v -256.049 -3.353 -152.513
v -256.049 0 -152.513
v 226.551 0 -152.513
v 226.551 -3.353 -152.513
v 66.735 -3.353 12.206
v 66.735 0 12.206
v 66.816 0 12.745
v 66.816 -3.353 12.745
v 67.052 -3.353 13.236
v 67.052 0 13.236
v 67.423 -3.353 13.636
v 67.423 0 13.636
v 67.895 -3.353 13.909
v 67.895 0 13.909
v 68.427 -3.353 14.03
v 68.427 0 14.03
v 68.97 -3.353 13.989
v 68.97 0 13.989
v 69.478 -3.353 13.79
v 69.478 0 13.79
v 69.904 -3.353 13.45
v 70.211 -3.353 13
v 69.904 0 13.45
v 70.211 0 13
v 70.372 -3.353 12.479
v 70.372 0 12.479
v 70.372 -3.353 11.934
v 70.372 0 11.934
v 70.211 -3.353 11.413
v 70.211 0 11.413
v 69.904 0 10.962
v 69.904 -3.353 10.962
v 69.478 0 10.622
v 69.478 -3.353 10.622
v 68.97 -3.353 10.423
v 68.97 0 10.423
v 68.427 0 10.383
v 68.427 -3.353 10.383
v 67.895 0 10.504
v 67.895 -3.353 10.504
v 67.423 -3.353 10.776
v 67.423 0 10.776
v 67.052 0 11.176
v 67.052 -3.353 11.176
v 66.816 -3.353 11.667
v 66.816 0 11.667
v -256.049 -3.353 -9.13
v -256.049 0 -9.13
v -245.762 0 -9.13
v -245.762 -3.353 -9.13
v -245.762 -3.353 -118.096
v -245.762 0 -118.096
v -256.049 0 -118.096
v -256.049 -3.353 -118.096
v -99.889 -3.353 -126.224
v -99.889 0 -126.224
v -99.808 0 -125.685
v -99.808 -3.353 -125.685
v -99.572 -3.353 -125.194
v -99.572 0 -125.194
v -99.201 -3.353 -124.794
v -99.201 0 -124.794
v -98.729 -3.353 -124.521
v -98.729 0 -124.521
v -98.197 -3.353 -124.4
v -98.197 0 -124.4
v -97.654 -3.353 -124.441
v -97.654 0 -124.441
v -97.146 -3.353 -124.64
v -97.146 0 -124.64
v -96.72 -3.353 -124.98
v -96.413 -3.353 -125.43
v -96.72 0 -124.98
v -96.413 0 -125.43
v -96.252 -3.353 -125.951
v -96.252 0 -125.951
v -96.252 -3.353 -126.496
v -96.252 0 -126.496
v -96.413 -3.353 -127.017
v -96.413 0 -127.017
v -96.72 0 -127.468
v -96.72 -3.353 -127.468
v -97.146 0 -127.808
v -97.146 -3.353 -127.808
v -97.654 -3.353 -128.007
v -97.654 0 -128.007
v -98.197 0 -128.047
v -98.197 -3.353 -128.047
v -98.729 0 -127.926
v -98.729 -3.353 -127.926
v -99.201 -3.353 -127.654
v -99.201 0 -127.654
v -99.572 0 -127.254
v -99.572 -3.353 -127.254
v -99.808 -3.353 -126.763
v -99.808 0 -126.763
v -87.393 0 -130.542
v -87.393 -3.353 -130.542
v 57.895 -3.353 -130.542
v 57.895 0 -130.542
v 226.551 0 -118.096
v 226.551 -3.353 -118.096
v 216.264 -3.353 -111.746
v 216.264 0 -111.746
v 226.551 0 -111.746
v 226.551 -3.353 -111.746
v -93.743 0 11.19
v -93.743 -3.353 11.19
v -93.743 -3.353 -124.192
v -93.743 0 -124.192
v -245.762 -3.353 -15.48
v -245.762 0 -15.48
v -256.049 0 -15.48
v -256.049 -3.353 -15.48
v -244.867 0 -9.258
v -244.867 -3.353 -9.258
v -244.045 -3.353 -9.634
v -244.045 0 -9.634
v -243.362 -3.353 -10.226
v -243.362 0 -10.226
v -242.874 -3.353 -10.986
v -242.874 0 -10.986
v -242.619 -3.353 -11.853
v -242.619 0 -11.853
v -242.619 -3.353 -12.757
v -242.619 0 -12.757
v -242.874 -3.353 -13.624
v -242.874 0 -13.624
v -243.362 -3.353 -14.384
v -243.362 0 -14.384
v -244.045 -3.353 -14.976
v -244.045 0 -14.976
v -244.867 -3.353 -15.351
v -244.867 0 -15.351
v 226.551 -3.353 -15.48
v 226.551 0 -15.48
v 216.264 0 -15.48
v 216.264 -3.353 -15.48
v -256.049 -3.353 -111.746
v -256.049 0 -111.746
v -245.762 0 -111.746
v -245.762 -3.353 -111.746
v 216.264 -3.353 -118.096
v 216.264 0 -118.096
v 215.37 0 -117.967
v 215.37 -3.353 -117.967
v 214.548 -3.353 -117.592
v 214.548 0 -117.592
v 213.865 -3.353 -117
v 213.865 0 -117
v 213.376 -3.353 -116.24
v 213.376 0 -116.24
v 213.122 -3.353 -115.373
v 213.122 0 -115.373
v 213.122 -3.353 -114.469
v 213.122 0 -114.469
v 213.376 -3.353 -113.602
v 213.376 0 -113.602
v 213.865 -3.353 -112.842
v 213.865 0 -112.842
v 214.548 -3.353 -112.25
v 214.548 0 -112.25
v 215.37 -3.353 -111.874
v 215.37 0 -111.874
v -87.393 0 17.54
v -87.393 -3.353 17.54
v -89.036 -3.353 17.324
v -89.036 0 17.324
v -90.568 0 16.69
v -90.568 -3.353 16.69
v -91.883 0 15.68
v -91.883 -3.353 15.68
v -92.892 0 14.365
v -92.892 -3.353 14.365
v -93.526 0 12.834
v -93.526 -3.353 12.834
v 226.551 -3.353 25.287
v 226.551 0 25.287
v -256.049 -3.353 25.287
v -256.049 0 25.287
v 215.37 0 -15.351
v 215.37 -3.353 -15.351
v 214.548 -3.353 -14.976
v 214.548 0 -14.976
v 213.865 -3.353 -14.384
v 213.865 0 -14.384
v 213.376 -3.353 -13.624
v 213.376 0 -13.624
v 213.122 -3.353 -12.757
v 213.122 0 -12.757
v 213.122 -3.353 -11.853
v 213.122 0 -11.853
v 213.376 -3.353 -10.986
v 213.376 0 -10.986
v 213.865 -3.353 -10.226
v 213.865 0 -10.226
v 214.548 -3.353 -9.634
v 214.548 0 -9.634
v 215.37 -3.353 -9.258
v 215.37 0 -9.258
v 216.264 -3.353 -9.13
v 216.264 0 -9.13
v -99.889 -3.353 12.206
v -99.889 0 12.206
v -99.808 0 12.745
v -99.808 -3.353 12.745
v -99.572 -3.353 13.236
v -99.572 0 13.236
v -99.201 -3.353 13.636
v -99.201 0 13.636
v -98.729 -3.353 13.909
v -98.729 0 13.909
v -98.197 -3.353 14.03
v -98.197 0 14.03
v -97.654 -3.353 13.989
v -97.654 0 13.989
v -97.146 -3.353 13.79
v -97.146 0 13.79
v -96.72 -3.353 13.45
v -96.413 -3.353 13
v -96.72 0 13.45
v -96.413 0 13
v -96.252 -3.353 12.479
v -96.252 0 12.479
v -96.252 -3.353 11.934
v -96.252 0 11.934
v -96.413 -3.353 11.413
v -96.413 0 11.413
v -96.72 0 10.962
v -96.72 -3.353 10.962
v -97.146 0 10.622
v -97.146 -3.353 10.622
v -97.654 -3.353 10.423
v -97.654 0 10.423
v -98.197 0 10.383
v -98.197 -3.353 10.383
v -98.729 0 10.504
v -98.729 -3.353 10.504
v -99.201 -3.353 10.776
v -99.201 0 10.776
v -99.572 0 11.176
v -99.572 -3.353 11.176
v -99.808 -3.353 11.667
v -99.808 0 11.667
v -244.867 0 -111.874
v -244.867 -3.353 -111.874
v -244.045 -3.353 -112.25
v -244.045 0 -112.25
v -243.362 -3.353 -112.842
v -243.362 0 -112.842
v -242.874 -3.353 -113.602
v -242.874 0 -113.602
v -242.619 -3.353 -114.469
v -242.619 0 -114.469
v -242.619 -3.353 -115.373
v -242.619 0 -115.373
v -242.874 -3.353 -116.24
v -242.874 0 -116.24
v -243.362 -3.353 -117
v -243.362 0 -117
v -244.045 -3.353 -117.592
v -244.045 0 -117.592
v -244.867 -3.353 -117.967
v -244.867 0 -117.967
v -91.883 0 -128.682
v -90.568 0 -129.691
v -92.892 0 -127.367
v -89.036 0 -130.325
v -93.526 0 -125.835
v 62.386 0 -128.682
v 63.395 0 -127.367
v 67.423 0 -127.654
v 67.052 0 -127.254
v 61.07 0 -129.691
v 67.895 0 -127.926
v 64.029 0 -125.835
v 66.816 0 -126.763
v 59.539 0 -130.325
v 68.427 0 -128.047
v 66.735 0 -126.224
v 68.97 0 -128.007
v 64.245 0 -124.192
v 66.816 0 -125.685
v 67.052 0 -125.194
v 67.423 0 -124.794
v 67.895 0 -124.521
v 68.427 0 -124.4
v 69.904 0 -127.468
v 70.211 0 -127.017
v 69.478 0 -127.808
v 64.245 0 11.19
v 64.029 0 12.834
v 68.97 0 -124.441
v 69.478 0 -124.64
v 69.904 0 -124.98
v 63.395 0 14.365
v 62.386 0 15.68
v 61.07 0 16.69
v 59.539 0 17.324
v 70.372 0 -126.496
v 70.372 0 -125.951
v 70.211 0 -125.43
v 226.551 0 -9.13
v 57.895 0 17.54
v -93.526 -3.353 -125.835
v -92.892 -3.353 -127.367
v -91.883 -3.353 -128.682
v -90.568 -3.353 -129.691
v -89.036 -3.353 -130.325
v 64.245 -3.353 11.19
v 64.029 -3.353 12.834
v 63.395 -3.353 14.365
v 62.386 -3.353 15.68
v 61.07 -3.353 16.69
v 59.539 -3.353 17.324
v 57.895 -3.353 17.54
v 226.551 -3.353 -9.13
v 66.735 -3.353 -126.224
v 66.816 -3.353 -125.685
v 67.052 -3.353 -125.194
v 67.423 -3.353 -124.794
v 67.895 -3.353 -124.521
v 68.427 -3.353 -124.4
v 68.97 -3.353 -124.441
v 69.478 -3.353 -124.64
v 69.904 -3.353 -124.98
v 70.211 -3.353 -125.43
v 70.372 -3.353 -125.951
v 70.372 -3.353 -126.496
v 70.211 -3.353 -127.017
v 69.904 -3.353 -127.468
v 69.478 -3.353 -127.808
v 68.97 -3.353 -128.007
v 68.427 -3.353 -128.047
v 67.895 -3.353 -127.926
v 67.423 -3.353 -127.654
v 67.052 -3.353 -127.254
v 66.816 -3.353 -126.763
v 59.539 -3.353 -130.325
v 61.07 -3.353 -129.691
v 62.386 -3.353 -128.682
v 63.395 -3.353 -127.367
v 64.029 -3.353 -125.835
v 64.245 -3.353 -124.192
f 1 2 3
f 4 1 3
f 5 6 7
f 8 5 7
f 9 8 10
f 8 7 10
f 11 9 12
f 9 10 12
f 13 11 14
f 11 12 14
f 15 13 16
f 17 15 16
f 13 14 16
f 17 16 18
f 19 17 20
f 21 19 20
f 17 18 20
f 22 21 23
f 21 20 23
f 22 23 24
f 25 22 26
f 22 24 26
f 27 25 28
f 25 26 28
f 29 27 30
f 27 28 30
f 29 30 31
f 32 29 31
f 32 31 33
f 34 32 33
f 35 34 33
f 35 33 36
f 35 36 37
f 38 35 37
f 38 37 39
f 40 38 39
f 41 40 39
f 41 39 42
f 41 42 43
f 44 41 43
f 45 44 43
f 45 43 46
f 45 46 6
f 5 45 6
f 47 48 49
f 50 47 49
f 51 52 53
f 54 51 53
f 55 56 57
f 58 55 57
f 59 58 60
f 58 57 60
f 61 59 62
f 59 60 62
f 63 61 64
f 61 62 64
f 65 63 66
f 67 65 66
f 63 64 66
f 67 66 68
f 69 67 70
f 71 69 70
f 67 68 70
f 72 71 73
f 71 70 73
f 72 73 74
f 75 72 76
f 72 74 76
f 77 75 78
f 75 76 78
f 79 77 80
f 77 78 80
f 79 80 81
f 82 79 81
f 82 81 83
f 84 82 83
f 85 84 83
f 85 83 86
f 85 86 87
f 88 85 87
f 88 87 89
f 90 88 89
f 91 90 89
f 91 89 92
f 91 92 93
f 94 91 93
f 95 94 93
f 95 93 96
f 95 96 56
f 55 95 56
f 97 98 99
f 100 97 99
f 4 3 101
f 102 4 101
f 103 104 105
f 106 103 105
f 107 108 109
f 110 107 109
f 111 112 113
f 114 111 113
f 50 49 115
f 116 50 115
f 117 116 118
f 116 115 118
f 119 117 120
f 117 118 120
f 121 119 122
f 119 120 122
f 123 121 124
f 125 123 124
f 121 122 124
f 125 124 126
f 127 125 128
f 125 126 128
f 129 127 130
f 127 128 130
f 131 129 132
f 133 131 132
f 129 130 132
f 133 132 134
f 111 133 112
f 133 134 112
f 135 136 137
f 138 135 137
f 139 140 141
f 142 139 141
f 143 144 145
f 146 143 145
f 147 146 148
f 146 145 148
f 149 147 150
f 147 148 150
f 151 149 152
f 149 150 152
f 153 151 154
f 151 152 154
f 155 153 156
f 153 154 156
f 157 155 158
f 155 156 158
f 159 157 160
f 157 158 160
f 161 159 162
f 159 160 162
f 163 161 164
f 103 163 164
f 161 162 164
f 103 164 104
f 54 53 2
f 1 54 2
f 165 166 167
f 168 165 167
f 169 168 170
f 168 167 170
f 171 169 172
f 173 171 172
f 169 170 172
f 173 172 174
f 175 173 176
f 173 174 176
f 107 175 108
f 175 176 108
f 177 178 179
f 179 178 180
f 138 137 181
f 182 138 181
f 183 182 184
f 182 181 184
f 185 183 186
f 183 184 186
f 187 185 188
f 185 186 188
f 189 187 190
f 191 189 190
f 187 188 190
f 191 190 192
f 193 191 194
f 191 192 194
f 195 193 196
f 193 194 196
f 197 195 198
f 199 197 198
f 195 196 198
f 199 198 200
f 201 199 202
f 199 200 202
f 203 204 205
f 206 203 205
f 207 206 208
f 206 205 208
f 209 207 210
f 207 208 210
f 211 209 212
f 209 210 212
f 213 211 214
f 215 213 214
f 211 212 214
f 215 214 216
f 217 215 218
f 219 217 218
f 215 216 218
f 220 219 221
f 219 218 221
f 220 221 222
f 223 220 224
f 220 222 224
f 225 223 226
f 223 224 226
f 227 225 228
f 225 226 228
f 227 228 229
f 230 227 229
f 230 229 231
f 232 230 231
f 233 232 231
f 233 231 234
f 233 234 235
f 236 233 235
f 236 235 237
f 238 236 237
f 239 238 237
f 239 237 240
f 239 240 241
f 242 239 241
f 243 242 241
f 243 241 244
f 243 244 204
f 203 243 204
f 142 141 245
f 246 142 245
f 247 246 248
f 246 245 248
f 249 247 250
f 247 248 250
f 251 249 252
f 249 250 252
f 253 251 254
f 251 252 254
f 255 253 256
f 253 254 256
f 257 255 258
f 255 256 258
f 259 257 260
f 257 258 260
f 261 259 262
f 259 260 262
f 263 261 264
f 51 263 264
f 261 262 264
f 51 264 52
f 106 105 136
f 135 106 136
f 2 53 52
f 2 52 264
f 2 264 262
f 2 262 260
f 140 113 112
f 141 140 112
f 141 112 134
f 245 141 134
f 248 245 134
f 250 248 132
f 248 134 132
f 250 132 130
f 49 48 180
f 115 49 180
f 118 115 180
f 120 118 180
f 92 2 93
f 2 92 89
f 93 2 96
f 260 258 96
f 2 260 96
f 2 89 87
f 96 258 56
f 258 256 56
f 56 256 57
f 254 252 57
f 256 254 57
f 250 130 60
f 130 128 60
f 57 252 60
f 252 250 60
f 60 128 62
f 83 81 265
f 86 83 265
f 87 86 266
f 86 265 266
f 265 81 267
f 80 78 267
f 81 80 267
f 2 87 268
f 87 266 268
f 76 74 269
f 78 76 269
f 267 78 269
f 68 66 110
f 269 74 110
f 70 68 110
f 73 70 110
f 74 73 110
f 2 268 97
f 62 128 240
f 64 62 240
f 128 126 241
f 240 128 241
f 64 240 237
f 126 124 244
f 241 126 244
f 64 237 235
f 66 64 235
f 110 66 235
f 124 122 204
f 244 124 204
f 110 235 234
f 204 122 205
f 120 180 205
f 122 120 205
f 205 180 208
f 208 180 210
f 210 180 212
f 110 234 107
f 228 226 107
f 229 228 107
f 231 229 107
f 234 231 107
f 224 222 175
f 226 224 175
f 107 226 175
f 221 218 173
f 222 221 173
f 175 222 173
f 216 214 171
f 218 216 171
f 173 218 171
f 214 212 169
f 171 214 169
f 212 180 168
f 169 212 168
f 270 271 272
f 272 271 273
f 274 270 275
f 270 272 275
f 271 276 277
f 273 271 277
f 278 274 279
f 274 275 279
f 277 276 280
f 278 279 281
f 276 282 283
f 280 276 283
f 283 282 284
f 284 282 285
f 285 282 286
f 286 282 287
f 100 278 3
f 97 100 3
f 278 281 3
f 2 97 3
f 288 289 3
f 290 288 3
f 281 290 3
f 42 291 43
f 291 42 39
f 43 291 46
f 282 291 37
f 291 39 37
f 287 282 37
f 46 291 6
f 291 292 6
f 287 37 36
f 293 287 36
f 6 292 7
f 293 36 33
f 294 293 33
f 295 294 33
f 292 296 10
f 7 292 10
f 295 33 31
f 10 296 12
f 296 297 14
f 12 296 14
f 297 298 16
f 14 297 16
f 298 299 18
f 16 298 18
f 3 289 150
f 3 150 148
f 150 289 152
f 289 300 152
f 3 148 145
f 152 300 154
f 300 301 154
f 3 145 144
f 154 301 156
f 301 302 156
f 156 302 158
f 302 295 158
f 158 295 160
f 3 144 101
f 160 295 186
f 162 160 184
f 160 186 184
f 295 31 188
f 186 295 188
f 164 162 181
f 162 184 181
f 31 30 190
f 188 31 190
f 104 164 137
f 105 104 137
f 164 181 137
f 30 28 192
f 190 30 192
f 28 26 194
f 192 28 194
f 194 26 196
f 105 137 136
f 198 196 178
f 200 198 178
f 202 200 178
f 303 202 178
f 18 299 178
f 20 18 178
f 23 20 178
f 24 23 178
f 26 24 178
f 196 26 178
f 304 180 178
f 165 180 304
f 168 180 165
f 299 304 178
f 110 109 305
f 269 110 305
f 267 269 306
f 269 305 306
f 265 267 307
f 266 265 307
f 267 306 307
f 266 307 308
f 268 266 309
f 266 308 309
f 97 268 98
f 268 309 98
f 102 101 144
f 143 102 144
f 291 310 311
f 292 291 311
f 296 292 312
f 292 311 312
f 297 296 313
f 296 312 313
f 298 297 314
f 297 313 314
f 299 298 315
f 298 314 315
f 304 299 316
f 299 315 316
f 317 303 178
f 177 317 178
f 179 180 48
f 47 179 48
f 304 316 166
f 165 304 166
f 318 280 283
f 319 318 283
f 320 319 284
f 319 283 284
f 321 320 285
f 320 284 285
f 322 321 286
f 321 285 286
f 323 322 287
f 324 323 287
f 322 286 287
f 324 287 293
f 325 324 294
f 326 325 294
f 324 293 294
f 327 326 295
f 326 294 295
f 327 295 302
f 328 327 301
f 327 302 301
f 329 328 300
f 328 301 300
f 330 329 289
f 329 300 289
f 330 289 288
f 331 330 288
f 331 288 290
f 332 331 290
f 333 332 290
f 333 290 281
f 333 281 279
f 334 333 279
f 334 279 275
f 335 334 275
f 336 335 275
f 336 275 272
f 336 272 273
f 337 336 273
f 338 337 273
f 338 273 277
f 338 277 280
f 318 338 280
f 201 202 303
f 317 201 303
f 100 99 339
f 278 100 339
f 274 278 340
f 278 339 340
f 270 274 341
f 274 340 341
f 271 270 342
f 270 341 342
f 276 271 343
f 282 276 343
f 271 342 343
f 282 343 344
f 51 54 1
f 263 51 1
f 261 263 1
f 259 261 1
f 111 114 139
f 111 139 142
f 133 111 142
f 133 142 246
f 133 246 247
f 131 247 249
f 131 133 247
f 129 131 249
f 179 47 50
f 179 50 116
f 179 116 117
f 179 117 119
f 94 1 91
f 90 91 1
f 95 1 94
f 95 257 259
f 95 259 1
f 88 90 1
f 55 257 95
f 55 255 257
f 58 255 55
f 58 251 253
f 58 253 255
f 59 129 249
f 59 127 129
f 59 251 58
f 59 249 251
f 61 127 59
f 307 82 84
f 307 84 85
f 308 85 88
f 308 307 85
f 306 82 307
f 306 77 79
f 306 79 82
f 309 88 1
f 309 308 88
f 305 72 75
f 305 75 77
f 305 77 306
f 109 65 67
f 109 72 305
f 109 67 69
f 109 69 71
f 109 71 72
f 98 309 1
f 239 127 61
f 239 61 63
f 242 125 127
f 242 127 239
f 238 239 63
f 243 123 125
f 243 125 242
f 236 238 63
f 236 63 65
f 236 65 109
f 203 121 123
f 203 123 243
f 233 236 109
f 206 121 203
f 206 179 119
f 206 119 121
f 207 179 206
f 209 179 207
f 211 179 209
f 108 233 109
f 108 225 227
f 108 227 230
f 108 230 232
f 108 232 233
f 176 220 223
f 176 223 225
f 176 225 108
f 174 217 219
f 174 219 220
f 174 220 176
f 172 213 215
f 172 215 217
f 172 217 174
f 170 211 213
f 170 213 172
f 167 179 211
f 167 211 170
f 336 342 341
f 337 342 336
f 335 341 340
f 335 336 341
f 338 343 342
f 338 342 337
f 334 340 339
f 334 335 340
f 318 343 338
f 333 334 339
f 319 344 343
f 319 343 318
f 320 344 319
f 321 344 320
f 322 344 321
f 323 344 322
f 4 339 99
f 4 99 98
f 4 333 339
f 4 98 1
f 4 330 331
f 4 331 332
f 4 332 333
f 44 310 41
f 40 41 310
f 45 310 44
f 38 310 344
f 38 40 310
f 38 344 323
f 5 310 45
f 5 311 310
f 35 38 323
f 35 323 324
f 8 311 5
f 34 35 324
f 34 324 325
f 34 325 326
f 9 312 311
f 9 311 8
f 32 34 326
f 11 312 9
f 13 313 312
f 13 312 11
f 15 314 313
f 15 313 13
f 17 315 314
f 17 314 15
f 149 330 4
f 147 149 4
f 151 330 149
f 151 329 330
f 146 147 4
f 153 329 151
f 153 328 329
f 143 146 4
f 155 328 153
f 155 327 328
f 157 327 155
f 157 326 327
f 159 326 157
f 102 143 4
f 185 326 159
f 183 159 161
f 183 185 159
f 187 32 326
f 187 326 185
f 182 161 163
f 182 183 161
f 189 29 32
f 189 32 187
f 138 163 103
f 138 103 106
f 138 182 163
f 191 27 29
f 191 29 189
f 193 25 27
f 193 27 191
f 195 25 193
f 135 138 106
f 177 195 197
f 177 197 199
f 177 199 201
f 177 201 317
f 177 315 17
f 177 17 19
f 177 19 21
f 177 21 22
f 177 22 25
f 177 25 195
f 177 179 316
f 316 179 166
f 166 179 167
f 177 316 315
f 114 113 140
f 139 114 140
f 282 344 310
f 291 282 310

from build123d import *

# Parameters (mm, degrees)
F1_DEPTH = 3.3528
F3_DEPTH = 3.3528
F4_D     = 3.6576


with BuildPart() as f1:
    # F0 (on Front) → F1 (new body)
    with BuildSketch(Plane.XZ):
        with BuildLine():
            Line((-256.0487464639, -118.0957335805), (-256.0487464639, -152.5127335805))
            Line((-256.0487464639, -152.5127335805), (226.5512535361, -152.5127335805))
            Line((226.5512535361, -152.5127335805), (226.5512535361, -118.0957335805))
            Line((226.5512535361, -118.0957335805), (216.2642535361, -118.0957335805))
            ThreePointArc((216.2642535361, -118.0957335805), (213.0892535361, -114.9207335805), (216.2642535361, -111.7457335805))
            Line((216.2642535361, -111.7457335805), (226.5512535361, -111.7457335805))
            Line((226.5512535361, -111.7457335805), (226.5512535361, -15.4797335805))
            Line((226.5512535361, -15.4797335805), (216.2642535361, -15.4797335805))
            ThreePointArc((216.2642535361, -15.4797335805), (213.0892535361, -12.3047335805), (216.2642535361, -9.1297335805))
            Line((216.2642535361, -9.1297335805), (226.5512535361, -9.1297335805))
            Line((226.5512535361, -9.1297335805), (226.5512535361, 25.2872664195))
            Line((226.5512535361, 25.2872664195), (-256.0487464639, 25.2872664195))
            Line((-256.0487464639, 25.2872664195), (-256.0487464639, -9.1297335805))
            Line((-256.0487464639, -9.1297335805), (-245.7617464639, -9.1297335805))
            ThreePointArc((-245.7617464639, -9.1297335805), (-242.5867464639, -12.3047335805), (-245.7617464639, -15.4797335805))
            Line((-245.7617464639, -15.4797335805), (-256.0487464639, -15.4797335805))
            Line((-256.0487464639, -15.4797335805), (-256.0487464639, -111.7457335805))
            Line((-256.0487464639, -111.7457335805), (-245.7617464639, -111.7457335805))
            ThreePointArc((-245.7617464639, -111.7457335805), (-242.5867464639, -114.9207335805), (-245.7617464639, -118.0957335805))
            Line((-245.7617464639, -118.0957335805), (-256.0487464639, -118.0957335805))
        make_face()
    extrude(amount=F1_DEPTH)

    # F2 (on face) → F3 (cut, through all)
    with BuildSketch(Plane.XZ.offset(3.3528)):
        with BuildLine():
            ThreePointArc((64.2454358226, 11.190272807), (62.3855638831, 15.6804008674), (57.8954358226, 17.5402728069))
            Line((57.8954358226, 17.5402728069), (-87.3925641774, 17.5402728068))
            ThreePointArc((-87.3925641774, 17.5402728068), (-91.8826922379, 15.6804008674), (-93.7425641774, 11.1902728068))
            Line((-93.7425641774, 11.1902728068), (-93.7425641774, -124.1917271931))
            ThreePointArc((-93.7425641774, -124.1917271931), (-91.882692238, -128.6818552537), (-87.3925641774, -130.5417271931))
            Line((-87.3925641774, -130.5417271931), (57.8954358225, -130.5417271931))
            ThreePointArc((57.8954358225, -130.5417271931), (62.3855638831, -128.6818552536), (64.2454358226, -124.1917271931))
            Line((64.2454358226, -124.1917271931), (64.2454358226, 11.190272807))
        make_face()
    extrude(amount=-F3_DEPTH, mode=Mode.SUBTRACT)

    # F4 (through all)
    with Locations(Plane.XZ.offset(3.3528)):
        with Locations((-98.0605641774, -126.2237271929), (68.5634358226, -126.2237271929), (68.5634358226, 12.2062728071), (-98.0605641774, 12.2062728071)):
            Hole(F4_D / 2)


solid = f1.part
